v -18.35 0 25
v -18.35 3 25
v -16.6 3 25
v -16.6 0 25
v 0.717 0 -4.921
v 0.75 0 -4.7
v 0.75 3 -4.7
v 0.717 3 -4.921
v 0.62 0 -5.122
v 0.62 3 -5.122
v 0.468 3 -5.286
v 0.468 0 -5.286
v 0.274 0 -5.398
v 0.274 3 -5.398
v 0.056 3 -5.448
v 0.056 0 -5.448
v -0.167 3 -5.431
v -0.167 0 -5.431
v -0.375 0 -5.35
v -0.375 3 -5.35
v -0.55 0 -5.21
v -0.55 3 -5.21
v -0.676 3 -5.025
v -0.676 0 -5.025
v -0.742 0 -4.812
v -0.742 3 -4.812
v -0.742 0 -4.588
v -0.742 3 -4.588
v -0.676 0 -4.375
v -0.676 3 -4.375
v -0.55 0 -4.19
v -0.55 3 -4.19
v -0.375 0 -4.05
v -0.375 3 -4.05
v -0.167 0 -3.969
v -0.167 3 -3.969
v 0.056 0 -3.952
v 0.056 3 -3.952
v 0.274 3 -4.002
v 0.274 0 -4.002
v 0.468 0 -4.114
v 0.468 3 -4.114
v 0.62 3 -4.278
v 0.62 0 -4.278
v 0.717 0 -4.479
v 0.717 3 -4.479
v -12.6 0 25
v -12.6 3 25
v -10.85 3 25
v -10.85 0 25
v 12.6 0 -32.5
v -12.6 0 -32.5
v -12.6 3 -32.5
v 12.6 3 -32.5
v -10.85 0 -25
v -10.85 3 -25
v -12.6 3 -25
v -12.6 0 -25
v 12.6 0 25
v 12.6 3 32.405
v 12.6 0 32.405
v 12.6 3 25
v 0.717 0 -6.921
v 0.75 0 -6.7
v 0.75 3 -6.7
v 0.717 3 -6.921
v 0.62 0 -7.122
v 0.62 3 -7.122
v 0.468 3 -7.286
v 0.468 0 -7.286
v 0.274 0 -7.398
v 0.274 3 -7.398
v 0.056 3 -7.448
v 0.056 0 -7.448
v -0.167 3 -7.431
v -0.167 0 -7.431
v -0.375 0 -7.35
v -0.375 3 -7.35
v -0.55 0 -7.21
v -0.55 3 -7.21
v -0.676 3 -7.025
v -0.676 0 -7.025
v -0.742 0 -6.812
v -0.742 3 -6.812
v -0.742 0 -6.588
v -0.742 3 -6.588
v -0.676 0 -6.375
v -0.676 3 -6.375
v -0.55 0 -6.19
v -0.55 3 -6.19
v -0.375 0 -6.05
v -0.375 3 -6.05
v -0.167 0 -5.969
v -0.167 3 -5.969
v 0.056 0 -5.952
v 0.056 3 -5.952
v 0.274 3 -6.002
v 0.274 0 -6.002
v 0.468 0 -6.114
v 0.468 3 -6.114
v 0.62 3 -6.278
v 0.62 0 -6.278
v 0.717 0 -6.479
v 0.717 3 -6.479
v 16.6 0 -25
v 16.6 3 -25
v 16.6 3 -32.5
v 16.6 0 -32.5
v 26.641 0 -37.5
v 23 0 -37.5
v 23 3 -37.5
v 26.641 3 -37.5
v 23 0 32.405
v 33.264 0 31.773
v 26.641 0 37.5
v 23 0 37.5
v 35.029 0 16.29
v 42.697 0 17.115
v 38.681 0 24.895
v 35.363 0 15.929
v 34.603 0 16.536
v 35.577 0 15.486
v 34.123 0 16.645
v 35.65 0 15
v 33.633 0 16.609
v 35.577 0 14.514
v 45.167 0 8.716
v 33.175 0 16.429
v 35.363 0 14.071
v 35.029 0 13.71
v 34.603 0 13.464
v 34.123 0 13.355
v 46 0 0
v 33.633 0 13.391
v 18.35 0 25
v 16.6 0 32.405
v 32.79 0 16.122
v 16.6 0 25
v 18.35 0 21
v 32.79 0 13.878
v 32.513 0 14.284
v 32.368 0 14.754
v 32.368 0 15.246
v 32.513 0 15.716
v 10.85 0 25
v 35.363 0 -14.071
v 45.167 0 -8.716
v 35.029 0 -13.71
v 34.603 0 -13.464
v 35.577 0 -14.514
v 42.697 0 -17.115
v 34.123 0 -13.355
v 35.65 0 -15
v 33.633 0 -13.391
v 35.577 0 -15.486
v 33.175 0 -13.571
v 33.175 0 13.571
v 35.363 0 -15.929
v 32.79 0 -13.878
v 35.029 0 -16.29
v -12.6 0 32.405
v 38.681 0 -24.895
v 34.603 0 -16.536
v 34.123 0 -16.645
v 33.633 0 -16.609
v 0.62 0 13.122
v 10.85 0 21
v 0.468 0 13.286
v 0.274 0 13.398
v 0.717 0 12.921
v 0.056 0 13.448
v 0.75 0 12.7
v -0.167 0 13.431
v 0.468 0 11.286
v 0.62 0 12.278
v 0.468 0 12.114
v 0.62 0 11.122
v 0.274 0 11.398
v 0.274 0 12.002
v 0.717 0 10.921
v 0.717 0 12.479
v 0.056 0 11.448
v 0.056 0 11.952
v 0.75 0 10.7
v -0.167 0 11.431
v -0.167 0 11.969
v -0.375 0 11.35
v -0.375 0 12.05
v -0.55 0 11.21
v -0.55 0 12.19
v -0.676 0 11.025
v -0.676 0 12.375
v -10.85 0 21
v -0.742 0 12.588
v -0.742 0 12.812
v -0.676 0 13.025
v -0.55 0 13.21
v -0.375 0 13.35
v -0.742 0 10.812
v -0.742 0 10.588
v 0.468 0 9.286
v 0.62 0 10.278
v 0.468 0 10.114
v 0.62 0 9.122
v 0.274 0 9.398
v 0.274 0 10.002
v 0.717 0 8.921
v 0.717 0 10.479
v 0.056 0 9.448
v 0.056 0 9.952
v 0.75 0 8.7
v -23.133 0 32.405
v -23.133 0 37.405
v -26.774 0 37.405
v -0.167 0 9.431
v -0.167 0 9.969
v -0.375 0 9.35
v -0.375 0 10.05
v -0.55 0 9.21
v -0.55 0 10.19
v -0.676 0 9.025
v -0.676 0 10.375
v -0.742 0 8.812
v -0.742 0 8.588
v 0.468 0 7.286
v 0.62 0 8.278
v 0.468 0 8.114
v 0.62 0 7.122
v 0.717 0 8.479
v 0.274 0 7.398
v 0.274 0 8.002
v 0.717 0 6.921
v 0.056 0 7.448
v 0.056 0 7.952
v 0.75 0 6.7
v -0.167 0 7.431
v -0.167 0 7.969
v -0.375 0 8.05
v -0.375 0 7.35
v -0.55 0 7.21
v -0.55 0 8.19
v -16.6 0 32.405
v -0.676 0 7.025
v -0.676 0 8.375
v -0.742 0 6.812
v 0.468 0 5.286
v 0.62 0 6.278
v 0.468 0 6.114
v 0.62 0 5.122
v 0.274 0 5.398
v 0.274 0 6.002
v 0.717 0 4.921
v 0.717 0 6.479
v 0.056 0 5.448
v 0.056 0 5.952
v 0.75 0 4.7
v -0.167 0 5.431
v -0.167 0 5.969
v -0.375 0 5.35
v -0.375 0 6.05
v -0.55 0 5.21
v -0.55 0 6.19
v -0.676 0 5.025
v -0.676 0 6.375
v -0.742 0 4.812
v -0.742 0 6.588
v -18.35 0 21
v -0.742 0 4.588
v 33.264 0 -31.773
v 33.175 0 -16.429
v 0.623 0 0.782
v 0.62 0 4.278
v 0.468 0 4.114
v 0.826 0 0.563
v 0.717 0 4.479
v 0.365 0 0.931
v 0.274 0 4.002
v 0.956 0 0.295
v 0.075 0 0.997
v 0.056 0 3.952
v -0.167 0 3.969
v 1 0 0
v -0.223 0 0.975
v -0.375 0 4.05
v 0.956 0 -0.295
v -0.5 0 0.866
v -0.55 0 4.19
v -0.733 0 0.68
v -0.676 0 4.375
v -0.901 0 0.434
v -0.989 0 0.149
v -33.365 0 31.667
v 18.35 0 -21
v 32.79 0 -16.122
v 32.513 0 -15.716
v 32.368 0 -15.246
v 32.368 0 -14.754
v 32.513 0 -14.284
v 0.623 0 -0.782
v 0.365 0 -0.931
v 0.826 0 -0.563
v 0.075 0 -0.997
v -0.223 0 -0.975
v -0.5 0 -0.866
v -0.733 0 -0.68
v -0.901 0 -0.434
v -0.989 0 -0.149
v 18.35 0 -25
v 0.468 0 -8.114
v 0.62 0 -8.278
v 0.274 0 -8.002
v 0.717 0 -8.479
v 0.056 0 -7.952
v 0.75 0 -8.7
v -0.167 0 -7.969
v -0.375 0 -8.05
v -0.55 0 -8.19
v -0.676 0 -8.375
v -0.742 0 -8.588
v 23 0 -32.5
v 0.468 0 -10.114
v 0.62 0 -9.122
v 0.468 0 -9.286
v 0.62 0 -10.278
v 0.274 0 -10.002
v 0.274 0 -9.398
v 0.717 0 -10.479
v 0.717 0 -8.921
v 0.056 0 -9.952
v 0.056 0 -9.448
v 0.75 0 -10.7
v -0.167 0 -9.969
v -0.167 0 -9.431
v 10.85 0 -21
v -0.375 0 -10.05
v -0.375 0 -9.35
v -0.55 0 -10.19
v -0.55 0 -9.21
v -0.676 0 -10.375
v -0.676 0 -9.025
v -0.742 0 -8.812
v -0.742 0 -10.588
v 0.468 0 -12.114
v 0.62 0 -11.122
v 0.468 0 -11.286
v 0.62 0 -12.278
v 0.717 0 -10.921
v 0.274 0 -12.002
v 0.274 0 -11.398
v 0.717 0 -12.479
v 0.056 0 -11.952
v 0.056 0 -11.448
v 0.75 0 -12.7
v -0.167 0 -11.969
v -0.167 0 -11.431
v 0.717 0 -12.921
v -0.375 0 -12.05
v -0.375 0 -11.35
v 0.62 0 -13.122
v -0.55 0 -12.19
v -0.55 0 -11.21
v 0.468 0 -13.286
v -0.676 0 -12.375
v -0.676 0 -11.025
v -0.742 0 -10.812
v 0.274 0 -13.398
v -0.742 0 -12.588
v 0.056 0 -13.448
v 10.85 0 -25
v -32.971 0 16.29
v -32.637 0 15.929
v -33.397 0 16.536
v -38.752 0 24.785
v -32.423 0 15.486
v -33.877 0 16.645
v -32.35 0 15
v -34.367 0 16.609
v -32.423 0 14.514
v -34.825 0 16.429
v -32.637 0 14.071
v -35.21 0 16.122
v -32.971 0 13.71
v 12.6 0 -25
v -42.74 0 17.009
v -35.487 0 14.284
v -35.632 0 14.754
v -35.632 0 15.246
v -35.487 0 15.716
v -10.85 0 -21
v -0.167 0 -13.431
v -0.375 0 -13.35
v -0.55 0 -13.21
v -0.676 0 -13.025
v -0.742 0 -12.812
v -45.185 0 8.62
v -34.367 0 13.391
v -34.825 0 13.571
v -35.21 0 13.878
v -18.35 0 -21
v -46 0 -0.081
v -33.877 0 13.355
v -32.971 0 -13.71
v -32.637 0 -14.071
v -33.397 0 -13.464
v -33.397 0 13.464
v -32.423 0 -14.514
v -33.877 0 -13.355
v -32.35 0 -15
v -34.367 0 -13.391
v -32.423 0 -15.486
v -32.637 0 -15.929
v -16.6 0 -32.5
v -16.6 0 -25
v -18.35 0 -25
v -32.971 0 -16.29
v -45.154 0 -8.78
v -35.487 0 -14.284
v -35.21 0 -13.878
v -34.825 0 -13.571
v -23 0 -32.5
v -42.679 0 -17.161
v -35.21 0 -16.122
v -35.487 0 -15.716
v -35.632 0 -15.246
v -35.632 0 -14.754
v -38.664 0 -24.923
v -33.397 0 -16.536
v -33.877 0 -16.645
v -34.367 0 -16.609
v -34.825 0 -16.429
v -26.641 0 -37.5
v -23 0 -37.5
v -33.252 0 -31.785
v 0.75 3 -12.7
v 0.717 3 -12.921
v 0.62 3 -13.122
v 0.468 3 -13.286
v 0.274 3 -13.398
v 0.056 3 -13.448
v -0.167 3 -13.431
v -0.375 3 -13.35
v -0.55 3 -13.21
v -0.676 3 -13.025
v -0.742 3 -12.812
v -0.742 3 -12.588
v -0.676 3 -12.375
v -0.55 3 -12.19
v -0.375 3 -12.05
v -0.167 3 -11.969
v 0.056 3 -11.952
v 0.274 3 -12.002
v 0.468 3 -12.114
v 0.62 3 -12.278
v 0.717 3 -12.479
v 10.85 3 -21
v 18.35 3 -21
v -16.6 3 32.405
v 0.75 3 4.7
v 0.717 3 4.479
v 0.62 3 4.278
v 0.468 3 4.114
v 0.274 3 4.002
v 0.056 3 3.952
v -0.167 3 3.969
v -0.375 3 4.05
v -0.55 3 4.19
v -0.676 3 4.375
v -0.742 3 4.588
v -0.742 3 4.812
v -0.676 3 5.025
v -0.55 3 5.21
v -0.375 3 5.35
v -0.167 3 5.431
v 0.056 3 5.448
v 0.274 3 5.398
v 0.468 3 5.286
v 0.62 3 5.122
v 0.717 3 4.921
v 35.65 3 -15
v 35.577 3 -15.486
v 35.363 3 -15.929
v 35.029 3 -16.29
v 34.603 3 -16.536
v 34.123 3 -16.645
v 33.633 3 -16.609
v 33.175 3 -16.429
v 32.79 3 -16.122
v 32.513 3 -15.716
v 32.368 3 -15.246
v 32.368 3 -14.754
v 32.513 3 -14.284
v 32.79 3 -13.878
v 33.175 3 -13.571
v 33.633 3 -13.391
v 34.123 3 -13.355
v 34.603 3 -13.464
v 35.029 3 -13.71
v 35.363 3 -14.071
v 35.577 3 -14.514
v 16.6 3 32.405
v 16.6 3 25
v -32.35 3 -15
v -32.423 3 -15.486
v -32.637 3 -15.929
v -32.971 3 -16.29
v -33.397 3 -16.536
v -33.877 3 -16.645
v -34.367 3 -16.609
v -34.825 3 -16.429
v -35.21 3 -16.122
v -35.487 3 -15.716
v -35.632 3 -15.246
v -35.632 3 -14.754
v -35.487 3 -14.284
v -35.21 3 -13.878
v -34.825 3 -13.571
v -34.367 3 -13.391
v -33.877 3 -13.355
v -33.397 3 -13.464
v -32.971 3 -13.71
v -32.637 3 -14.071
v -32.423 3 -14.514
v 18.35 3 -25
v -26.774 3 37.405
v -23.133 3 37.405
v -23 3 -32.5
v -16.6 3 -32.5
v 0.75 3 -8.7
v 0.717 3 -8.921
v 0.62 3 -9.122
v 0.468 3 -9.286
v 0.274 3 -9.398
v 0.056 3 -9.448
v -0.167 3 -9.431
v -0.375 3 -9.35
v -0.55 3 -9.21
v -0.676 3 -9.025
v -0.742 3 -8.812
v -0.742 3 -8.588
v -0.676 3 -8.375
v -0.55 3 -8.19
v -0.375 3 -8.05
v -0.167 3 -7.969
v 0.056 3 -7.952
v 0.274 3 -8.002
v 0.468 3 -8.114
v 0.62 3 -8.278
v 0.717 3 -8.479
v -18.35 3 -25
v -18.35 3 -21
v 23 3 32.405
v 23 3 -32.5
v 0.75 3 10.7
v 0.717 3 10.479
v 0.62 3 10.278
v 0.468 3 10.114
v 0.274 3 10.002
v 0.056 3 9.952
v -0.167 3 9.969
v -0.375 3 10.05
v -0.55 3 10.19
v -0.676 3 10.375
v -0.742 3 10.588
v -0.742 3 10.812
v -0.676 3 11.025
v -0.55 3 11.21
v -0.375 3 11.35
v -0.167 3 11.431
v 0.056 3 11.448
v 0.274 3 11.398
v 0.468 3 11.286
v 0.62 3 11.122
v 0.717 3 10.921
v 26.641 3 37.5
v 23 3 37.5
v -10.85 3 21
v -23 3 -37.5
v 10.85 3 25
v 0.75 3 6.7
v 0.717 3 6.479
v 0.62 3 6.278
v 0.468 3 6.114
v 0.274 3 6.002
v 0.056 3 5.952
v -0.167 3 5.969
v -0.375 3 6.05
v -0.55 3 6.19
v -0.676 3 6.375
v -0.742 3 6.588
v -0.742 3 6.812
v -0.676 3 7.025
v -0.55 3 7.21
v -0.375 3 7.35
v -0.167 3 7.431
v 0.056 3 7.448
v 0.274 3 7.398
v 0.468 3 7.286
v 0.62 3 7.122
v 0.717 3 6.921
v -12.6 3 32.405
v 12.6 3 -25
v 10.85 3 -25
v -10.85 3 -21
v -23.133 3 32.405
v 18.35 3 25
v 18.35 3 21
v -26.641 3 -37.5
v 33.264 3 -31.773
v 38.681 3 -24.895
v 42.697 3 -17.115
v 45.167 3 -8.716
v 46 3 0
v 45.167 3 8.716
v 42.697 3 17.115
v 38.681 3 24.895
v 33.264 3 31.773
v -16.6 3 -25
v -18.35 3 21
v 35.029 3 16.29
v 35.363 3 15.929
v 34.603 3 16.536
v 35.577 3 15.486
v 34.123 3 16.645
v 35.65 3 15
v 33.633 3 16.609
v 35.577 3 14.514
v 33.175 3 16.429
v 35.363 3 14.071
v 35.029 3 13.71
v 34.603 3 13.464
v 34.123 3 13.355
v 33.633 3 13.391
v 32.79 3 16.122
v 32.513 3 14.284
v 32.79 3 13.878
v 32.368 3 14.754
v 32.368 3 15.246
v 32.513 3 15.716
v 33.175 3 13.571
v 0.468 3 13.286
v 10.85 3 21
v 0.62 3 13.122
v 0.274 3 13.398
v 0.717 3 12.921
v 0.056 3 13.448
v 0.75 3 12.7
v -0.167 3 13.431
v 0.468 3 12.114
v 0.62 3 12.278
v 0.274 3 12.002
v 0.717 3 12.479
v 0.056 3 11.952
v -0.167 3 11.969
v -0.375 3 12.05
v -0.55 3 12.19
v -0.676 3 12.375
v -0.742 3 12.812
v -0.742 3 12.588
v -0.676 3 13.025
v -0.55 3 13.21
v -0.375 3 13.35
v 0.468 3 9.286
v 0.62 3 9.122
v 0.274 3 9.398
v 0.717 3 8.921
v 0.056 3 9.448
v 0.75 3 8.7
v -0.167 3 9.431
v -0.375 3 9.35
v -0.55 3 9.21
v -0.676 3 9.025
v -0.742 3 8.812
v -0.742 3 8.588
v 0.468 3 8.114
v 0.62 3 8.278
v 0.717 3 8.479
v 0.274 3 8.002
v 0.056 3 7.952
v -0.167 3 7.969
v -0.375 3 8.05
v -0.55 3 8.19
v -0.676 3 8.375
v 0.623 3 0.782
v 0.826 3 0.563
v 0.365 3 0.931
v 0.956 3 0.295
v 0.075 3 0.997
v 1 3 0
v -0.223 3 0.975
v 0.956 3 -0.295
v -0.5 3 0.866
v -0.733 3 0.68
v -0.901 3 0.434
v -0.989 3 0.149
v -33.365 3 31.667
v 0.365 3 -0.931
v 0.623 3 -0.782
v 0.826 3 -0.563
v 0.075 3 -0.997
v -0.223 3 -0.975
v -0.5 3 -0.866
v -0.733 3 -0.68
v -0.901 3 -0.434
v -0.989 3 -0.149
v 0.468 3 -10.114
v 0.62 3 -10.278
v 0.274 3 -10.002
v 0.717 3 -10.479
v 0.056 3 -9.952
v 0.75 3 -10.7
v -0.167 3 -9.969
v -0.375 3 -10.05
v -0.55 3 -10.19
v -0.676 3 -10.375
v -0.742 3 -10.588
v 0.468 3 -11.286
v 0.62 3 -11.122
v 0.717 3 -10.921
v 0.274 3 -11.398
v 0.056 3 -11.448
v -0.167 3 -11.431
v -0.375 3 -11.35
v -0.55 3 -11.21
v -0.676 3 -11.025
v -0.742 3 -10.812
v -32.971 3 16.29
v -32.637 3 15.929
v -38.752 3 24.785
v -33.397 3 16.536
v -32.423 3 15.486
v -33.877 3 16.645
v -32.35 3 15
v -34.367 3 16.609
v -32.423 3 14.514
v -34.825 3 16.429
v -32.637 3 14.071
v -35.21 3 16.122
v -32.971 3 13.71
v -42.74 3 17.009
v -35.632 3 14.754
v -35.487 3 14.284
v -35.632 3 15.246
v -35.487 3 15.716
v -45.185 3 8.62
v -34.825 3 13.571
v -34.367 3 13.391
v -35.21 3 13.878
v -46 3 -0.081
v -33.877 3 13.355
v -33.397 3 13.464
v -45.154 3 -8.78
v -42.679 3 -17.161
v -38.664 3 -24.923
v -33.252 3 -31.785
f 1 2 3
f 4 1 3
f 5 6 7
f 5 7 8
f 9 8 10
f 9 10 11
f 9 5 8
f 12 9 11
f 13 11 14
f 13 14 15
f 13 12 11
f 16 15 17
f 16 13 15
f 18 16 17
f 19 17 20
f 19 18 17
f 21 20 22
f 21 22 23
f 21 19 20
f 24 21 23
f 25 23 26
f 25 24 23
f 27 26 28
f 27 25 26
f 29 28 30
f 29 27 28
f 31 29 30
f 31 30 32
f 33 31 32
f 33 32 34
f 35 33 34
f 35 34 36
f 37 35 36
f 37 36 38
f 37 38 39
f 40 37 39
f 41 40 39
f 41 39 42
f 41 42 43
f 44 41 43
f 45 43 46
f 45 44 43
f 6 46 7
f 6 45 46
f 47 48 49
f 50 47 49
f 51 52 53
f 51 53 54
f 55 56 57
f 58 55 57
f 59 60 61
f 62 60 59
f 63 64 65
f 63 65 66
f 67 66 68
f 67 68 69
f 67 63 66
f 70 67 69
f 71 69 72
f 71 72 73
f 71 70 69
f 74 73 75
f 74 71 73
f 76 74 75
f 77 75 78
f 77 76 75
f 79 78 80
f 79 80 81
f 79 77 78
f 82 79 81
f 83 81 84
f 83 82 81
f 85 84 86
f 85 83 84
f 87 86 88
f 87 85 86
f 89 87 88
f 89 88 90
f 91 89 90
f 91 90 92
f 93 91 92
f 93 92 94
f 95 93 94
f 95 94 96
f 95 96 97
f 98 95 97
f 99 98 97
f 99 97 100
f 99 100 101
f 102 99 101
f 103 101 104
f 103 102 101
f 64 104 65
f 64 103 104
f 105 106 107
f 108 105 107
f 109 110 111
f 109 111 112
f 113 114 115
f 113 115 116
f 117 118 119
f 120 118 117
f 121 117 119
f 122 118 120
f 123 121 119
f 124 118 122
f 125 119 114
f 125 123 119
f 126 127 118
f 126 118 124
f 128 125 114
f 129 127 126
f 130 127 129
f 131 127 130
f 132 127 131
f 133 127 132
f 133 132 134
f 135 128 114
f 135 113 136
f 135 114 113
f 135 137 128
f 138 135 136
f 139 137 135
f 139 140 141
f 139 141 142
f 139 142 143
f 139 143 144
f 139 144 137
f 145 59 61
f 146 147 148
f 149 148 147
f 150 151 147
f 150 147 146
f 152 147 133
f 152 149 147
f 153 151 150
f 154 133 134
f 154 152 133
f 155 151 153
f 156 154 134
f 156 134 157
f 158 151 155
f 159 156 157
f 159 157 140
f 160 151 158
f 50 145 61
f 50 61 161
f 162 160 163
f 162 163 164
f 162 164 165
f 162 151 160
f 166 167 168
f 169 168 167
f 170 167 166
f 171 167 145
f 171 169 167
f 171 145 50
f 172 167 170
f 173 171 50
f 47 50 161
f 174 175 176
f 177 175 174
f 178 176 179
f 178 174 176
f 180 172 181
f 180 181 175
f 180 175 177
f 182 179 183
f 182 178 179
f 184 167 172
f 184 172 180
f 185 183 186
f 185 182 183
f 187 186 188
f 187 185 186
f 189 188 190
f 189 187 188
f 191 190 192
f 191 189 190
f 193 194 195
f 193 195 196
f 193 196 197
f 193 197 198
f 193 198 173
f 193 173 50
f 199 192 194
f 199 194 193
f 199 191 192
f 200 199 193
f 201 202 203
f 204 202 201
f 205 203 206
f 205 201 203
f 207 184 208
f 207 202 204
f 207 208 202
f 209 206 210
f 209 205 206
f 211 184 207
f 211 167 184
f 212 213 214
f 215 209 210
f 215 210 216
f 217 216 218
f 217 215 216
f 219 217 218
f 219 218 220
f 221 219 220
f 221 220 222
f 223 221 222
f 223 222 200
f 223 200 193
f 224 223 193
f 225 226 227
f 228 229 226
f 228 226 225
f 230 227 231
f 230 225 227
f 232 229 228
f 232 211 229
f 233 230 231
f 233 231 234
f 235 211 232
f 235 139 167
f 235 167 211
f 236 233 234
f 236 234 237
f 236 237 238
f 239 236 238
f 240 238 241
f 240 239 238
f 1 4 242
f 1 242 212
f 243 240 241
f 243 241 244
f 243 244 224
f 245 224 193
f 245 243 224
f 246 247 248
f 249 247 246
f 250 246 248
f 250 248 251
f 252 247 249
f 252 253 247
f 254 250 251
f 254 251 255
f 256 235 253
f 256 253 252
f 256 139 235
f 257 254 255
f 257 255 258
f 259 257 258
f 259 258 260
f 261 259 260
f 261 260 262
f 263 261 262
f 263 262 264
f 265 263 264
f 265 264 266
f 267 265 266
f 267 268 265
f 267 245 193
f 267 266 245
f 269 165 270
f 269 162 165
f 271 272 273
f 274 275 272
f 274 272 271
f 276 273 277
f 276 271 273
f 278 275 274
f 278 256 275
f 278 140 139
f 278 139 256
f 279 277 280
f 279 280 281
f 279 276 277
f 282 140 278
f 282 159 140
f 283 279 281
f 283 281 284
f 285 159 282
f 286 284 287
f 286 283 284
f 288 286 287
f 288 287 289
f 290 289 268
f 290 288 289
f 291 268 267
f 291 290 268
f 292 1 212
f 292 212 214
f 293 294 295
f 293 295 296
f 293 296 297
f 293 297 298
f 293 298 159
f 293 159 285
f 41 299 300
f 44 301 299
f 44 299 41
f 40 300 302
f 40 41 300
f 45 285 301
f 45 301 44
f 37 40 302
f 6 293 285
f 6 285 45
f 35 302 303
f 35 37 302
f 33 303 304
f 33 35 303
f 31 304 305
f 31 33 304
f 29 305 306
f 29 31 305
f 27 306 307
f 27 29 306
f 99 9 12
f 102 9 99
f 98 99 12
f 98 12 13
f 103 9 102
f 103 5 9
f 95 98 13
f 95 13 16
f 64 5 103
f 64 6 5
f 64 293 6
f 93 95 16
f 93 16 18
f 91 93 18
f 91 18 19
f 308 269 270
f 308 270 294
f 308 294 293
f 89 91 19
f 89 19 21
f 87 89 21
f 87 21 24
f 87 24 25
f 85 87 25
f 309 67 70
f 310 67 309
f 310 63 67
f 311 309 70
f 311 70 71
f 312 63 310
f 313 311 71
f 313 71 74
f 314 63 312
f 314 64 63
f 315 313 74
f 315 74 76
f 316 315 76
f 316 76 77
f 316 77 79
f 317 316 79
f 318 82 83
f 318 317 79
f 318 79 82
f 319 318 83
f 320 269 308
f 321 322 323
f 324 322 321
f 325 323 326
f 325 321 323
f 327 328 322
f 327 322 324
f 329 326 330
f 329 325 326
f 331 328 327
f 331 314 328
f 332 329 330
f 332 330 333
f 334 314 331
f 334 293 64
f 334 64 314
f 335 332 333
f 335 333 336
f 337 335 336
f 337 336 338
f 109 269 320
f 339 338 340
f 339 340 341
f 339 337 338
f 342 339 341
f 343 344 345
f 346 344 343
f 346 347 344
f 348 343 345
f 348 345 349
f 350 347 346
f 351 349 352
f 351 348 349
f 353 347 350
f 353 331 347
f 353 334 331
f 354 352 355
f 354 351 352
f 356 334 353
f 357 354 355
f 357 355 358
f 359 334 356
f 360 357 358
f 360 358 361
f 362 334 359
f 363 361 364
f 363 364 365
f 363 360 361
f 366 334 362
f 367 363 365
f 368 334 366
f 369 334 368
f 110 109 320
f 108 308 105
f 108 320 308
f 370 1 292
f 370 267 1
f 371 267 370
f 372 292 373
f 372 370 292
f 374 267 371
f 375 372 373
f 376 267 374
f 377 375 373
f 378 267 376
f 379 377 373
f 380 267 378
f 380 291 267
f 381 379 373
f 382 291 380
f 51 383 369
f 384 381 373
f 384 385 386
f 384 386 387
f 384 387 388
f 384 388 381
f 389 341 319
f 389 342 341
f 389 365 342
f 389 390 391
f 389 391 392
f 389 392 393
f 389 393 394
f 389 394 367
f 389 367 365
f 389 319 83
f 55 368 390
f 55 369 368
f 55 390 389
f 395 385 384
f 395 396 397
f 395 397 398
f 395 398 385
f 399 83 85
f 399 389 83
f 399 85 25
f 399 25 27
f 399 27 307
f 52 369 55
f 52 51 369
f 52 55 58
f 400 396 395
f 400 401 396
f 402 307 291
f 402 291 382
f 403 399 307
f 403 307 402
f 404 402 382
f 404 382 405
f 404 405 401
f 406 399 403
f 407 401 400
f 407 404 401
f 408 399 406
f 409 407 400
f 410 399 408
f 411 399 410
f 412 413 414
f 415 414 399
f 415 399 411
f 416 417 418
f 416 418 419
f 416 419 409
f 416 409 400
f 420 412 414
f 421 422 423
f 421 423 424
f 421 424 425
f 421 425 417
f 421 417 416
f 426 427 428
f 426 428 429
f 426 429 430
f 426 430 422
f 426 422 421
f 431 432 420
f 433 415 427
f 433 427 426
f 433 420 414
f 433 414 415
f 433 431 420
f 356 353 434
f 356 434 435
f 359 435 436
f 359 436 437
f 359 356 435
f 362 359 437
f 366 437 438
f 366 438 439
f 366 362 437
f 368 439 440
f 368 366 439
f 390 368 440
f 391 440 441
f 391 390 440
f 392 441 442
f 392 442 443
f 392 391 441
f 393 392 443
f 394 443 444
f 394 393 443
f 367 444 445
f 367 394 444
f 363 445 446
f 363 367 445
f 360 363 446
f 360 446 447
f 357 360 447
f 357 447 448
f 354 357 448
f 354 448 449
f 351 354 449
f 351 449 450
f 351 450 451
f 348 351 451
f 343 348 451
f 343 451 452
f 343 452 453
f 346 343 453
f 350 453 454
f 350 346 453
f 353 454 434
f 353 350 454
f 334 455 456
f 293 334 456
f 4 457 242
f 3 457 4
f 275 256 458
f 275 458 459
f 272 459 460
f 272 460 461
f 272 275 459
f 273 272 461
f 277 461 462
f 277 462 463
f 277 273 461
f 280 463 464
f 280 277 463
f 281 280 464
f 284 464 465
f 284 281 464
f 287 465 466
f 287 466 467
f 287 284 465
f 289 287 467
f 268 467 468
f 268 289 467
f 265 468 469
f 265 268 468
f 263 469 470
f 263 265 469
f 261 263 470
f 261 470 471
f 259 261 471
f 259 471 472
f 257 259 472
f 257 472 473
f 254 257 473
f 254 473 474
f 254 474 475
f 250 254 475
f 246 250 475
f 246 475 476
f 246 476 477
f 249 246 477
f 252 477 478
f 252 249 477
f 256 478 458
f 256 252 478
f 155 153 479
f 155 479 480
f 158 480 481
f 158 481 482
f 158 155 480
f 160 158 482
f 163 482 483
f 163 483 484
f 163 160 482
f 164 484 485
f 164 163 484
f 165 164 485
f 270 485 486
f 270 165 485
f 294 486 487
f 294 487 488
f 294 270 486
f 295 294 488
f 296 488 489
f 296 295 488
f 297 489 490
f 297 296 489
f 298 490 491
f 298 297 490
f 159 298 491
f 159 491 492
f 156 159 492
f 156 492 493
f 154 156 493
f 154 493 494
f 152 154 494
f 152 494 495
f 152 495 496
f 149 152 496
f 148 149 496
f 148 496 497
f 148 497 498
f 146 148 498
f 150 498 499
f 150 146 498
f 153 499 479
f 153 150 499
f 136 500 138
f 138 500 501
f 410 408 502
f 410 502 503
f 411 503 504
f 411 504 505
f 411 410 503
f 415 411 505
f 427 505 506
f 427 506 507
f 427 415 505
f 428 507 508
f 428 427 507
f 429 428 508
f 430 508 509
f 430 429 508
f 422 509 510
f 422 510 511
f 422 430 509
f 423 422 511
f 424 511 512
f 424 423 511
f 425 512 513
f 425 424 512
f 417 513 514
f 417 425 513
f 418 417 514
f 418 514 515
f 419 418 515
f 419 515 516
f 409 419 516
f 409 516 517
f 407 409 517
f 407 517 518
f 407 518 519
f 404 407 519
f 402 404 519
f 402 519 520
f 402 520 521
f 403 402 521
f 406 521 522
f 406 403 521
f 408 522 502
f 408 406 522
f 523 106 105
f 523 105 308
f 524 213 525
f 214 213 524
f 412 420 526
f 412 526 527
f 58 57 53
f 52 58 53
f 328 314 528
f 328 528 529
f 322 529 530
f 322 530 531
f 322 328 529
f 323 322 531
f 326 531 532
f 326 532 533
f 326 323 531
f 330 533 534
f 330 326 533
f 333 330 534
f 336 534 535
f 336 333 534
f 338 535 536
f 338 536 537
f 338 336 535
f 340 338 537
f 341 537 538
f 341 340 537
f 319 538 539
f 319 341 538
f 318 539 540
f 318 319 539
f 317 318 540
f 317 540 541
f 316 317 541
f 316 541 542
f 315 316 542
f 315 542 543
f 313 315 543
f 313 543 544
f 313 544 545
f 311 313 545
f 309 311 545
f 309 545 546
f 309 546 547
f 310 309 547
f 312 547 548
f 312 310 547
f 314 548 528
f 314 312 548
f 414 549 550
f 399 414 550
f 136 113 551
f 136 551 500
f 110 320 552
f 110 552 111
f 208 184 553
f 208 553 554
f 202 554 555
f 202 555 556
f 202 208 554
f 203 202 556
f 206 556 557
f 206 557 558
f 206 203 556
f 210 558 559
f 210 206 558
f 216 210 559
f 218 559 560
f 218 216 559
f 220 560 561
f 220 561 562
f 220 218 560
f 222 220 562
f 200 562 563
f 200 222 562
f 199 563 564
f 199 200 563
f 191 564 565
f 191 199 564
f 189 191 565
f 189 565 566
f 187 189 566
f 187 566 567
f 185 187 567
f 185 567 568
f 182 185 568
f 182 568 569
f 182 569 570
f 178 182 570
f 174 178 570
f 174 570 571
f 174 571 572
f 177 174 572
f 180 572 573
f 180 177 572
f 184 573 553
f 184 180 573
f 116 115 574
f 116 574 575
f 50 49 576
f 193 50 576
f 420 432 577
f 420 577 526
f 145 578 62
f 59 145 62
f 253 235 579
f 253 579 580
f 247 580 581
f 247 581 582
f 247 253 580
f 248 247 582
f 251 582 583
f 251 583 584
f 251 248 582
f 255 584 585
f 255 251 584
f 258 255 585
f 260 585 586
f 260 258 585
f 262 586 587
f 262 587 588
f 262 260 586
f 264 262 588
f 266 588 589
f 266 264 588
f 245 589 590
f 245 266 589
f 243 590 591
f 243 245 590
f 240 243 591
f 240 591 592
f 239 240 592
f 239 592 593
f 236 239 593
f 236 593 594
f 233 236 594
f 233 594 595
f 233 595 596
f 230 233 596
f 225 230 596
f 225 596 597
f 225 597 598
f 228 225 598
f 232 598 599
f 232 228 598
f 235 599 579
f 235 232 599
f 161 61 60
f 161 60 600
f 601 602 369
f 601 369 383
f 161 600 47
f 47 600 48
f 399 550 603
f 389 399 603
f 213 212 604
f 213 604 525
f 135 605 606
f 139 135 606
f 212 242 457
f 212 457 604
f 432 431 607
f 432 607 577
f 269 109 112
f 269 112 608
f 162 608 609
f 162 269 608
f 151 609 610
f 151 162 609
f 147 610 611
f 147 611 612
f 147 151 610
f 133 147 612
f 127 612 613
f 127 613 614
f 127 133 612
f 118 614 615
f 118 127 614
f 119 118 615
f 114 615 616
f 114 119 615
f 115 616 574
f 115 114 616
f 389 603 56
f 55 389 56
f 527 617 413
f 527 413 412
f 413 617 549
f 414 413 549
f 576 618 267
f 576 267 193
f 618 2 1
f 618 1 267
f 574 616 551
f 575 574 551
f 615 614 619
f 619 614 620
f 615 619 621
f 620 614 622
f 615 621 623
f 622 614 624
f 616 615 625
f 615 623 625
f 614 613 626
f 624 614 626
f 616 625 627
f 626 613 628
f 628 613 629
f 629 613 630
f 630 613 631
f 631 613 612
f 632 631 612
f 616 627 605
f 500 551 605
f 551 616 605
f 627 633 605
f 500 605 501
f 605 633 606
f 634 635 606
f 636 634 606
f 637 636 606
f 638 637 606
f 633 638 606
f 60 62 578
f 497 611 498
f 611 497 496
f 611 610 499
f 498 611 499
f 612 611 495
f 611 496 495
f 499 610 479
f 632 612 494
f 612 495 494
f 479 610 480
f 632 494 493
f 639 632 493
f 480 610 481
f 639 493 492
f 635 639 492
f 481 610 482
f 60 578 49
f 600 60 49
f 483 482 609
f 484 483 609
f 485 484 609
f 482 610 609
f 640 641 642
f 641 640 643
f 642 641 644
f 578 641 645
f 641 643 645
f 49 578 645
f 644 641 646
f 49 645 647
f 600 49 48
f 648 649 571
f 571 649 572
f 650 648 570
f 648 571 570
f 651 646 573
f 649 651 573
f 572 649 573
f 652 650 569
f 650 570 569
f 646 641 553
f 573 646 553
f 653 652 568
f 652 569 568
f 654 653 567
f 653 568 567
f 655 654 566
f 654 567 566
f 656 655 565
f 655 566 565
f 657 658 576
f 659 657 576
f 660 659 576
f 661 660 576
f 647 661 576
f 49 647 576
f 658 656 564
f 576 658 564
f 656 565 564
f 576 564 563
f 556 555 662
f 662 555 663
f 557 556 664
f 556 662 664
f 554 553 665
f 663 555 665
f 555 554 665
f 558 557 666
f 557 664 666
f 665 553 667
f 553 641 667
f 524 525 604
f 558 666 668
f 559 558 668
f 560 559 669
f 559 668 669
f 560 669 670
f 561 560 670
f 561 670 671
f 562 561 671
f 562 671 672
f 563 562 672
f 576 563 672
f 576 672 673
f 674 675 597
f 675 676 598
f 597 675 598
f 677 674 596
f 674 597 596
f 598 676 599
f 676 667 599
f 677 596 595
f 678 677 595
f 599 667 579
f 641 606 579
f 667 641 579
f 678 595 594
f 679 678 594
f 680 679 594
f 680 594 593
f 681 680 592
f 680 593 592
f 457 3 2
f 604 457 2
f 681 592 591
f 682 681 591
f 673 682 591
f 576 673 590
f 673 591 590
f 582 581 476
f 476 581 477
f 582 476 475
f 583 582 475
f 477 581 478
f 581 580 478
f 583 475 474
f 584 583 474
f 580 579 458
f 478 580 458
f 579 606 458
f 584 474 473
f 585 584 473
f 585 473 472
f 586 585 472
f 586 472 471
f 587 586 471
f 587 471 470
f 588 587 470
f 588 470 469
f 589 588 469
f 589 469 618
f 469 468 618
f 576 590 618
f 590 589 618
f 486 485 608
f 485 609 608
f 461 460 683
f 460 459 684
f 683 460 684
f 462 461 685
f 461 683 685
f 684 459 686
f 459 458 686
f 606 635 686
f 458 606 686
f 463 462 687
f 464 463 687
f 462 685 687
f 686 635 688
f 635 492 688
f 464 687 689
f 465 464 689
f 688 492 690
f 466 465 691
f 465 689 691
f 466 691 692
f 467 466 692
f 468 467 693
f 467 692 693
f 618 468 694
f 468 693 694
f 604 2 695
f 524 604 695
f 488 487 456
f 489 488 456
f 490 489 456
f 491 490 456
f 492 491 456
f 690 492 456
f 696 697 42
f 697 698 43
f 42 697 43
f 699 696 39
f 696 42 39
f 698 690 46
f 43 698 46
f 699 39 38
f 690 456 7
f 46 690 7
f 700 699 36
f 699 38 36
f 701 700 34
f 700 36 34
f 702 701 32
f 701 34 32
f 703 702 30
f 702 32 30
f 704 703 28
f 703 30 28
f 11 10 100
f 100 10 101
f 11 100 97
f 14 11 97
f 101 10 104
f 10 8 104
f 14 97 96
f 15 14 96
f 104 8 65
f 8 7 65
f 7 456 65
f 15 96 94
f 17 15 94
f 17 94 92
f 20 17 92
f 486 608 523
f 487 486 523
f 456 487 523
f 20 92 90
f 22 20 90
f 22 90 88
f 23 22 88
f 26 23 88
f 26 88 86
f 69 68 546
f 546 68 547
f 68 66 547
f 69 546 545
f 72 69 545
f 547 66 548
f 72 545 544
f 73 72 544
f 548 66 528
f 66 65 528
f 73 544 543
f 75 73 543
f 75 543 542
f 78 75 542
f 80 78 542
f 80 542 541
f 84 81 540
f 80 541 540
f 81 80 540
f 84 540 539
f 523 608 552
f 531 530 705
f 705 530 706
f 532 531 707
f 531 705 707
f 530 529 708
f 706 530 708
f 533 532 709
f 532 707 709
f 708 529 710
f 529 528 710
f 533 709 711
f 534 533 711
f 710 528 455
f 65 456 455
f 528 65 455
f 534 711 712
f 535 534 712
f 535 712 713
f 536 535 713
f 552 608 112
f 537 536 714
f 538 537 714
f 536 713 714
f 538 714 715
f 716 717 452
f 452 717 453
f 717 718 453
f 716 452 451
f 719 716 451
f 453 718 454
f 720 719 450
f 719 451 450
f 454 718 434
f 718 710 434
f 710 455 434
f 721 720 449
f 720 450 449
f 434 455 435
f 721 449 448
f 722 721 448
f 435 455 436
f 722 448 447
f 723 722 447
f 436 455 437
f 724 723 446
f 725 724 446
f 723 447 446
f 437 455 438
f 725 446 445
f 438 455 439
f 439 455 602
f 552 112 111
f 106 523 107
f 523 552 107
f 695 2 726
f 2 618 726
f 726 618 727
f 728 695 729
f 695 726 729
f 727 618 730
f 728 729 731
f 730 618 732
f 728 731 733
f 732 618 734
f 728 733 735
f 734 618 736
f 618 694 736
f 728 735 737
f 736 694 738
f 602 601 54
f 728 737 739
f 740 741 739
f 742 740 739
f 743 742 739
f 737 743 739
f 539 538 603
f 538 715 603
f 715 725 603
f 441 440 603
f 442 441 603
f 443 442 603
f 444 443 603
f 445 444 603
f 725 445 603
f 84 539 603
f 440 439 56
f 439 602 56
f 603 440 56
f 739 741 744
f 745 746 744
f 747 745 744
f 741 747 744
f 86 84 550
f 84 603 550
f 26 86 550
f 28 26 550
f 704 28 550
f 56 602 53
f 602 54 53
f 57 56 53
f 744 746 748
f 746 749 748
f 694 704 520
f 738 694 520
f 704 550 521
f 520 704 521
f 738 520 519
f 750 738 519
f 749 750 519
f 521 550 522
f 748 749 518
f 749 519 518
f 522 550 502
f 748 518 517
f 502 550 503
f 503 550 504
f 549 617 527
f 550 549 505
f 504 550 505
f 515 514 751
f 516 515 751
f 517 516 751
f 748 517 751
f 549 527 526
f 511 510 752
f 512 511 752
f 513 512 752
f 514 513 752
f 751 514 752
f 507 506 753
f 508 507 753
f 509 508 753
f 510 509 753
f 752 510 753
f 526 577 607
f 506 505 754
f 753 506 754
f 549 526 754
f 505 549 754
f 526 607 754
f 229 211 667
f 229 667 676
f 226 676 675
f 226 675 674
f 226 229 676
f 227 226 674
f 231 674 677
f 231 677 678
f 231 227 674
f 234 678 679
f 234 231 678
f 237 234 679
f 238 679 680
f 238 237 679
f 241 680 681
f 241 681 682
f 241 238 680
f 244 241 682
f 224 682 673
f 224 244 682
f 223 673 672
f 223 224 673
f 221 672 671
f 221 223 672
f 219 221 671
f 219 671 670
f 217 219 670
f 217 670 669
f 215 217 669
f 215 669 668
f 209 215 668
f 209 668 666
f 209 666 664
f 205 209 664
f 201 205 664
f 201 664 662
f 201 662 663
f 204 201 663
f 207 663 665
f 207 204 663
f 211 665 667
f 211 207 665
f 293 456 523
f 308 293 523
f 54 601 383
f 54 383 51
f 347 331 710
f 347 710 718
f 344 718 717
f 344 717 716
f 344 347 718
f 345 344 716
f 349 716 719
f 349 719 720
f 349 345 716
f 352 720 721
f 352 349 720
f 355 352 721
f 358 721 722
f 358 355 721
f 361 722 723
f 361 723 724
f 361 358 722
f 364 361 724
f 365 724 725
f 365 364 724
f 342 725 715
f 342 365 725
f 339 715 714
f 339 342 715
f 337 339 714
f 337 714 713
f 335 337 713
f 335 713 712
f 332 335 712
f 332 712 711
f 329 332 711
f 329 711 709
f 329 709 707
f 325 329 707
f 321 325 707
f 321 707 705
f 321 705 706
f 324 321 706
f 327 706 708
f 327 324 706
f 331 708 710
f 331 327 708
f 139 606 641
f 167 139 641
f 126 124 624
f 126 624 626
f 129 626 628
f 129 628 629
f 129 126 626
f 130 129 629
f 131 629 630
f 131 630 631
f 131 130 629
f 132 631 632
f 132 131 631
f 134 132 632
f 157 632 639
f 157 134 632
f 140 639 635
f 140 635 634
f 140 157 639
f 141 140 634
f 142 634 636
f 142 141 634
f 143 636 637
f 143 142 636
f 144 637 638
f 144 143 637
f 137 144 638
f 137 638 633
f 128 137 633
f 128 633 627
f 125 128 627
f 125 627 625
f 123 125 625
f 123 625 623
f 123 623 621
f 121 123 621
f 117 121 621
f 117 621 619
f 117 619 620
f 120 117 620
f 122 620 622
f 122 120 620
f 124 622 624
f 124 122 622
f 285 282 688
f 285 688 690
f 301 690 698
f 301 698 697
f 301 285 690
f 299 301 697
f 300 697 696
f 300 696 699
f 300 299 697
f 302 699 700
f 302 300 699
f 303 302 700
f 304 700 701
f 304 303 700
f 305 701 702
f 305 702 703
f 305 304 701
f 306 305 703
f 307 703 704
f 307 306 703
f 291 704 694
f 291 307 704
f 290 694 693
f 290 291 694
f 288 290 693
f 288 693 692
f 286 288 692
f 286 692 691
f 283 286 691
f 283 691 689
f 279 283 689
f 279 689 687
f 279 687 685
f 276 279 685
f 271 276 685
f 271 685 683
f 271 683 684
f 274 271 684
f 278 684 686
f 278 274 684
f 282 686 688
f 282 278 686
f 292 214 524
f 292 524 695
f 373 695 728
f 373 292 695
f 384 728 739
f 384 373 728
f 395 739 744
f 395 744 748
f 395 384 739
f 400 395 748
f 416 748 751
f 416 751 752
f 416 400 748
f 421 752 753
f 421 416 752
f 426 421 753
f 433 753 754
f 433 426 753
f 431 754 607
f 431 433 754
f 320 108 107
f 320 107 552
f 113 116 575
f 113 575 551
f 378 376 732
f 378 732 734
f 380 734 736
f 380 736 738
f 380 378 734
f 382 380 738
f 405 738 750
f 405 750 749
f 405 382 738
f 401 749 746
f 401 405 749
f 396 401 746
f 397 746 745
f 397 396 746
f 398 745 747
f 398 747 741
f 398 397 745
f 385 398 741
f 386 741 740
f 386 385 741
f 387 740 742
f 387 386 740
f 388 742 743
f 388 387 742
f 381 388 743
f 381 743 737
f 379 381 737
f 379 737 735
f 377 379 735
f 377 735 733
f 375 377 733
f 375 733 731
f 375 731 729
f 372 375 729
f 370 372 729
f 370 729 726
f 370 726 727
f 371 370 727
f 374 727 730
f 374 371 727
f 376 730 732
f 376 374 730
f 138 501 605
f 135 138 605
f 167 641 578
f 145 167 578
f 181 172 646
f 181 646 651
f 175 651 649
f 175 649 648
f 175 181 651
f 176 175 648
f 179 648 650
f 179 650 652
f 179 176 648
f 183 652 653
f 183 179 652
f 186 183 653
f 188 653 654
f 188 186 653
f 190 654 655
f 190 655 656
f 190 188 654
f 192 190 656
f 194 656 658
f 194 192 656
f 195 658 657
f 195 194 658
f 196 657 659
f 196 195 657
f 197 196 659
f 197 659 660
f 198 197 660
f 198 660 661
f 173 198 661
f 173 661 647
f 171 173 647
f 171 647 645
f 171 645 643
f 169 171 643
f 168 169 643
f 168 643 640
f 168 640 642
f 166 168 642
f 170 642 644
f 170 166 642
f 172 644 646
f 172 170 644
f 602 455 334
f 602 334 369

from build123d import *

# Parameters (mm, degrees)
SKETCH1_R           = 1.65
SKETCH1_R_2         = 1
SKETCH1_R_3         = 0.75
BOSS_EXTRUDE1_DEPTH = 3
SKETCH2_W           = 4
SKETCH2_H           = 7.5
SKETCH2_W_2         = 7.5
SKETCH2_H_2         = 4
SKETCH2_H_3         = 7.405429953
CUT_EXTRUDE1_DEPTH  = 4


with BuildPart() as part:
    # Sketch1 → Boss-Extrude1 (new body)
    with BuildSketch(Plane(origin=(0, 0, 0), x_dir=(1, 0, 0), z_dir=(0, 1, 0))):
        with BuildLine():
            Line((-26.64113361, 37.5), (-23, 37.5))
            Line((-23, 37.5), (-23, 32.5))
            Line((-23, 32.5), (23, 32.5))
            Line((23, 32.5), (23, 37.5))
            Line((23, 37.5), (26.64113361, 37.5))
            ThreePointArc((26.64113361, 37.5), (46, 0), (26.64113361, -37.5))
            Line((26.64113361, -37.5), (23, -37.5))
            Line((23, -37.5), (23, -32.405429953))
            Line((23, -32.405429953), (-23.13261865, -32.405429953))
            Line((-23.13261865, -32.405429953), (-23.13261865, -37.405429953))
            Line((-23.13261865, -37.405429953), (-26.77375226, -37.405429953))
            ThreePointArc((-26.77375226, -37.405429953), (-45.999927904, 0.081442004), (-26.64113361, 37.5))
        make_face()
        with Locations((34, -15)):
            Circle(SKETCH1_R, mode=Mode.SUBTRACT)
        with Locations((34, 15)):
            Circle(SKETCH1_R, mode=Mode.SUBTRACT)
        with Locations((-34, 15)):
            Circle(SKETCH1_R, mode=Mode.SUBTRACT)
        with Locations((-34, -15)):
            Circle(SKETCH1_R, mode=Mode.SUBTRACT)
        Circle(SKETCH1_R_2, mode=Mode.SUBTRACT)
        with Locations((0, 8.7)):
            Circle(SKETCH1_R_3, mode=Mode.SUBTRACT)
        with Locations((0, 10.7)):
            Circle(SKETCH1_R_3, mode=Mode.SUBTRACT)
        with Locations((0, 12.7)):
            Circle(SKETCH1_R_3, mode=Mode.SUBTRACT)
        with Locations((0, 6.7)):
            Circle(SKETCH1_R_3, mode=Mode.SUBTRACT)
        with Locations((0, 4.7)):
            Circle(SKETCH1_R_3, mode=Mode.SUBTRACT)
        with Locations((0, -12.7)):
            Circle(SKETCH1_R_3, mode=Mode.SUBTRACT)
        with Locations((0, -10.7)):
            Circle(SKETCH1_R_3, mode=Mode.SUBTRACT)
        with Locations((0, -8.7)):
            Circle(SKETCH1_R_3, mode=Mode.SUBTRACT)
        with Locations((0, -6.7)):
            Circle(SKETCH1_R_3, mode=Mode.SUBTRACT)
        with Locations((0, -4.7)):
            Circle(SKETCH1_R_3, mode=Mode.SUBTRACT)
    extrude(amount=BOSS_EXTRUDE1_DEPTH)

    # Sketch2 → Cut-Extrude1 (cut, through all)
    with BuildSketch(Plane(origin=(0, 3, 0), x_dir=(1, 0, 0), z_dir=(0, 1, 0))):
        with Locations((-14.6, 28.75)):
            Rectangle(SKETCH2_W, SKETCH2_H)
        Polygon((-12.6, 25), (-16.6, 25), (-18.35, 25), (-18.35, 21), (-10.85, 21), (-10.85, 25), align=None)
        with Locations((14.6, 28.75)):
            Rectangle(SKETCH2_W, SKETCH2_H)
        with Locations((14.6, 23)):
            Rectangle(SKETCH2_W_2, SKETCH2_H_2)
        with Locations((-14.6, -23)):
            Rectangle(SKETCH2_W_2, SKETCH2_H_2)
        with Locations((-14.6, -28.702714977)):
            Rectangle(SKETCH2_W, SKETCH2_H_3)
        Polygon((12.6, -25), (16.6, -25), (18.35, -25), (18.35, -21), (10.85, -21), (10.85, -25), align=None)
        with Locations((14.6, -28.702714977)):
            Rectangle(SKETCH2_W, SKETCH2_H_3)
    extrude(amount=-CUT_EXTRUDE1_DEPTH, mode=Mode.SUBTRACT)


solid = part.part
